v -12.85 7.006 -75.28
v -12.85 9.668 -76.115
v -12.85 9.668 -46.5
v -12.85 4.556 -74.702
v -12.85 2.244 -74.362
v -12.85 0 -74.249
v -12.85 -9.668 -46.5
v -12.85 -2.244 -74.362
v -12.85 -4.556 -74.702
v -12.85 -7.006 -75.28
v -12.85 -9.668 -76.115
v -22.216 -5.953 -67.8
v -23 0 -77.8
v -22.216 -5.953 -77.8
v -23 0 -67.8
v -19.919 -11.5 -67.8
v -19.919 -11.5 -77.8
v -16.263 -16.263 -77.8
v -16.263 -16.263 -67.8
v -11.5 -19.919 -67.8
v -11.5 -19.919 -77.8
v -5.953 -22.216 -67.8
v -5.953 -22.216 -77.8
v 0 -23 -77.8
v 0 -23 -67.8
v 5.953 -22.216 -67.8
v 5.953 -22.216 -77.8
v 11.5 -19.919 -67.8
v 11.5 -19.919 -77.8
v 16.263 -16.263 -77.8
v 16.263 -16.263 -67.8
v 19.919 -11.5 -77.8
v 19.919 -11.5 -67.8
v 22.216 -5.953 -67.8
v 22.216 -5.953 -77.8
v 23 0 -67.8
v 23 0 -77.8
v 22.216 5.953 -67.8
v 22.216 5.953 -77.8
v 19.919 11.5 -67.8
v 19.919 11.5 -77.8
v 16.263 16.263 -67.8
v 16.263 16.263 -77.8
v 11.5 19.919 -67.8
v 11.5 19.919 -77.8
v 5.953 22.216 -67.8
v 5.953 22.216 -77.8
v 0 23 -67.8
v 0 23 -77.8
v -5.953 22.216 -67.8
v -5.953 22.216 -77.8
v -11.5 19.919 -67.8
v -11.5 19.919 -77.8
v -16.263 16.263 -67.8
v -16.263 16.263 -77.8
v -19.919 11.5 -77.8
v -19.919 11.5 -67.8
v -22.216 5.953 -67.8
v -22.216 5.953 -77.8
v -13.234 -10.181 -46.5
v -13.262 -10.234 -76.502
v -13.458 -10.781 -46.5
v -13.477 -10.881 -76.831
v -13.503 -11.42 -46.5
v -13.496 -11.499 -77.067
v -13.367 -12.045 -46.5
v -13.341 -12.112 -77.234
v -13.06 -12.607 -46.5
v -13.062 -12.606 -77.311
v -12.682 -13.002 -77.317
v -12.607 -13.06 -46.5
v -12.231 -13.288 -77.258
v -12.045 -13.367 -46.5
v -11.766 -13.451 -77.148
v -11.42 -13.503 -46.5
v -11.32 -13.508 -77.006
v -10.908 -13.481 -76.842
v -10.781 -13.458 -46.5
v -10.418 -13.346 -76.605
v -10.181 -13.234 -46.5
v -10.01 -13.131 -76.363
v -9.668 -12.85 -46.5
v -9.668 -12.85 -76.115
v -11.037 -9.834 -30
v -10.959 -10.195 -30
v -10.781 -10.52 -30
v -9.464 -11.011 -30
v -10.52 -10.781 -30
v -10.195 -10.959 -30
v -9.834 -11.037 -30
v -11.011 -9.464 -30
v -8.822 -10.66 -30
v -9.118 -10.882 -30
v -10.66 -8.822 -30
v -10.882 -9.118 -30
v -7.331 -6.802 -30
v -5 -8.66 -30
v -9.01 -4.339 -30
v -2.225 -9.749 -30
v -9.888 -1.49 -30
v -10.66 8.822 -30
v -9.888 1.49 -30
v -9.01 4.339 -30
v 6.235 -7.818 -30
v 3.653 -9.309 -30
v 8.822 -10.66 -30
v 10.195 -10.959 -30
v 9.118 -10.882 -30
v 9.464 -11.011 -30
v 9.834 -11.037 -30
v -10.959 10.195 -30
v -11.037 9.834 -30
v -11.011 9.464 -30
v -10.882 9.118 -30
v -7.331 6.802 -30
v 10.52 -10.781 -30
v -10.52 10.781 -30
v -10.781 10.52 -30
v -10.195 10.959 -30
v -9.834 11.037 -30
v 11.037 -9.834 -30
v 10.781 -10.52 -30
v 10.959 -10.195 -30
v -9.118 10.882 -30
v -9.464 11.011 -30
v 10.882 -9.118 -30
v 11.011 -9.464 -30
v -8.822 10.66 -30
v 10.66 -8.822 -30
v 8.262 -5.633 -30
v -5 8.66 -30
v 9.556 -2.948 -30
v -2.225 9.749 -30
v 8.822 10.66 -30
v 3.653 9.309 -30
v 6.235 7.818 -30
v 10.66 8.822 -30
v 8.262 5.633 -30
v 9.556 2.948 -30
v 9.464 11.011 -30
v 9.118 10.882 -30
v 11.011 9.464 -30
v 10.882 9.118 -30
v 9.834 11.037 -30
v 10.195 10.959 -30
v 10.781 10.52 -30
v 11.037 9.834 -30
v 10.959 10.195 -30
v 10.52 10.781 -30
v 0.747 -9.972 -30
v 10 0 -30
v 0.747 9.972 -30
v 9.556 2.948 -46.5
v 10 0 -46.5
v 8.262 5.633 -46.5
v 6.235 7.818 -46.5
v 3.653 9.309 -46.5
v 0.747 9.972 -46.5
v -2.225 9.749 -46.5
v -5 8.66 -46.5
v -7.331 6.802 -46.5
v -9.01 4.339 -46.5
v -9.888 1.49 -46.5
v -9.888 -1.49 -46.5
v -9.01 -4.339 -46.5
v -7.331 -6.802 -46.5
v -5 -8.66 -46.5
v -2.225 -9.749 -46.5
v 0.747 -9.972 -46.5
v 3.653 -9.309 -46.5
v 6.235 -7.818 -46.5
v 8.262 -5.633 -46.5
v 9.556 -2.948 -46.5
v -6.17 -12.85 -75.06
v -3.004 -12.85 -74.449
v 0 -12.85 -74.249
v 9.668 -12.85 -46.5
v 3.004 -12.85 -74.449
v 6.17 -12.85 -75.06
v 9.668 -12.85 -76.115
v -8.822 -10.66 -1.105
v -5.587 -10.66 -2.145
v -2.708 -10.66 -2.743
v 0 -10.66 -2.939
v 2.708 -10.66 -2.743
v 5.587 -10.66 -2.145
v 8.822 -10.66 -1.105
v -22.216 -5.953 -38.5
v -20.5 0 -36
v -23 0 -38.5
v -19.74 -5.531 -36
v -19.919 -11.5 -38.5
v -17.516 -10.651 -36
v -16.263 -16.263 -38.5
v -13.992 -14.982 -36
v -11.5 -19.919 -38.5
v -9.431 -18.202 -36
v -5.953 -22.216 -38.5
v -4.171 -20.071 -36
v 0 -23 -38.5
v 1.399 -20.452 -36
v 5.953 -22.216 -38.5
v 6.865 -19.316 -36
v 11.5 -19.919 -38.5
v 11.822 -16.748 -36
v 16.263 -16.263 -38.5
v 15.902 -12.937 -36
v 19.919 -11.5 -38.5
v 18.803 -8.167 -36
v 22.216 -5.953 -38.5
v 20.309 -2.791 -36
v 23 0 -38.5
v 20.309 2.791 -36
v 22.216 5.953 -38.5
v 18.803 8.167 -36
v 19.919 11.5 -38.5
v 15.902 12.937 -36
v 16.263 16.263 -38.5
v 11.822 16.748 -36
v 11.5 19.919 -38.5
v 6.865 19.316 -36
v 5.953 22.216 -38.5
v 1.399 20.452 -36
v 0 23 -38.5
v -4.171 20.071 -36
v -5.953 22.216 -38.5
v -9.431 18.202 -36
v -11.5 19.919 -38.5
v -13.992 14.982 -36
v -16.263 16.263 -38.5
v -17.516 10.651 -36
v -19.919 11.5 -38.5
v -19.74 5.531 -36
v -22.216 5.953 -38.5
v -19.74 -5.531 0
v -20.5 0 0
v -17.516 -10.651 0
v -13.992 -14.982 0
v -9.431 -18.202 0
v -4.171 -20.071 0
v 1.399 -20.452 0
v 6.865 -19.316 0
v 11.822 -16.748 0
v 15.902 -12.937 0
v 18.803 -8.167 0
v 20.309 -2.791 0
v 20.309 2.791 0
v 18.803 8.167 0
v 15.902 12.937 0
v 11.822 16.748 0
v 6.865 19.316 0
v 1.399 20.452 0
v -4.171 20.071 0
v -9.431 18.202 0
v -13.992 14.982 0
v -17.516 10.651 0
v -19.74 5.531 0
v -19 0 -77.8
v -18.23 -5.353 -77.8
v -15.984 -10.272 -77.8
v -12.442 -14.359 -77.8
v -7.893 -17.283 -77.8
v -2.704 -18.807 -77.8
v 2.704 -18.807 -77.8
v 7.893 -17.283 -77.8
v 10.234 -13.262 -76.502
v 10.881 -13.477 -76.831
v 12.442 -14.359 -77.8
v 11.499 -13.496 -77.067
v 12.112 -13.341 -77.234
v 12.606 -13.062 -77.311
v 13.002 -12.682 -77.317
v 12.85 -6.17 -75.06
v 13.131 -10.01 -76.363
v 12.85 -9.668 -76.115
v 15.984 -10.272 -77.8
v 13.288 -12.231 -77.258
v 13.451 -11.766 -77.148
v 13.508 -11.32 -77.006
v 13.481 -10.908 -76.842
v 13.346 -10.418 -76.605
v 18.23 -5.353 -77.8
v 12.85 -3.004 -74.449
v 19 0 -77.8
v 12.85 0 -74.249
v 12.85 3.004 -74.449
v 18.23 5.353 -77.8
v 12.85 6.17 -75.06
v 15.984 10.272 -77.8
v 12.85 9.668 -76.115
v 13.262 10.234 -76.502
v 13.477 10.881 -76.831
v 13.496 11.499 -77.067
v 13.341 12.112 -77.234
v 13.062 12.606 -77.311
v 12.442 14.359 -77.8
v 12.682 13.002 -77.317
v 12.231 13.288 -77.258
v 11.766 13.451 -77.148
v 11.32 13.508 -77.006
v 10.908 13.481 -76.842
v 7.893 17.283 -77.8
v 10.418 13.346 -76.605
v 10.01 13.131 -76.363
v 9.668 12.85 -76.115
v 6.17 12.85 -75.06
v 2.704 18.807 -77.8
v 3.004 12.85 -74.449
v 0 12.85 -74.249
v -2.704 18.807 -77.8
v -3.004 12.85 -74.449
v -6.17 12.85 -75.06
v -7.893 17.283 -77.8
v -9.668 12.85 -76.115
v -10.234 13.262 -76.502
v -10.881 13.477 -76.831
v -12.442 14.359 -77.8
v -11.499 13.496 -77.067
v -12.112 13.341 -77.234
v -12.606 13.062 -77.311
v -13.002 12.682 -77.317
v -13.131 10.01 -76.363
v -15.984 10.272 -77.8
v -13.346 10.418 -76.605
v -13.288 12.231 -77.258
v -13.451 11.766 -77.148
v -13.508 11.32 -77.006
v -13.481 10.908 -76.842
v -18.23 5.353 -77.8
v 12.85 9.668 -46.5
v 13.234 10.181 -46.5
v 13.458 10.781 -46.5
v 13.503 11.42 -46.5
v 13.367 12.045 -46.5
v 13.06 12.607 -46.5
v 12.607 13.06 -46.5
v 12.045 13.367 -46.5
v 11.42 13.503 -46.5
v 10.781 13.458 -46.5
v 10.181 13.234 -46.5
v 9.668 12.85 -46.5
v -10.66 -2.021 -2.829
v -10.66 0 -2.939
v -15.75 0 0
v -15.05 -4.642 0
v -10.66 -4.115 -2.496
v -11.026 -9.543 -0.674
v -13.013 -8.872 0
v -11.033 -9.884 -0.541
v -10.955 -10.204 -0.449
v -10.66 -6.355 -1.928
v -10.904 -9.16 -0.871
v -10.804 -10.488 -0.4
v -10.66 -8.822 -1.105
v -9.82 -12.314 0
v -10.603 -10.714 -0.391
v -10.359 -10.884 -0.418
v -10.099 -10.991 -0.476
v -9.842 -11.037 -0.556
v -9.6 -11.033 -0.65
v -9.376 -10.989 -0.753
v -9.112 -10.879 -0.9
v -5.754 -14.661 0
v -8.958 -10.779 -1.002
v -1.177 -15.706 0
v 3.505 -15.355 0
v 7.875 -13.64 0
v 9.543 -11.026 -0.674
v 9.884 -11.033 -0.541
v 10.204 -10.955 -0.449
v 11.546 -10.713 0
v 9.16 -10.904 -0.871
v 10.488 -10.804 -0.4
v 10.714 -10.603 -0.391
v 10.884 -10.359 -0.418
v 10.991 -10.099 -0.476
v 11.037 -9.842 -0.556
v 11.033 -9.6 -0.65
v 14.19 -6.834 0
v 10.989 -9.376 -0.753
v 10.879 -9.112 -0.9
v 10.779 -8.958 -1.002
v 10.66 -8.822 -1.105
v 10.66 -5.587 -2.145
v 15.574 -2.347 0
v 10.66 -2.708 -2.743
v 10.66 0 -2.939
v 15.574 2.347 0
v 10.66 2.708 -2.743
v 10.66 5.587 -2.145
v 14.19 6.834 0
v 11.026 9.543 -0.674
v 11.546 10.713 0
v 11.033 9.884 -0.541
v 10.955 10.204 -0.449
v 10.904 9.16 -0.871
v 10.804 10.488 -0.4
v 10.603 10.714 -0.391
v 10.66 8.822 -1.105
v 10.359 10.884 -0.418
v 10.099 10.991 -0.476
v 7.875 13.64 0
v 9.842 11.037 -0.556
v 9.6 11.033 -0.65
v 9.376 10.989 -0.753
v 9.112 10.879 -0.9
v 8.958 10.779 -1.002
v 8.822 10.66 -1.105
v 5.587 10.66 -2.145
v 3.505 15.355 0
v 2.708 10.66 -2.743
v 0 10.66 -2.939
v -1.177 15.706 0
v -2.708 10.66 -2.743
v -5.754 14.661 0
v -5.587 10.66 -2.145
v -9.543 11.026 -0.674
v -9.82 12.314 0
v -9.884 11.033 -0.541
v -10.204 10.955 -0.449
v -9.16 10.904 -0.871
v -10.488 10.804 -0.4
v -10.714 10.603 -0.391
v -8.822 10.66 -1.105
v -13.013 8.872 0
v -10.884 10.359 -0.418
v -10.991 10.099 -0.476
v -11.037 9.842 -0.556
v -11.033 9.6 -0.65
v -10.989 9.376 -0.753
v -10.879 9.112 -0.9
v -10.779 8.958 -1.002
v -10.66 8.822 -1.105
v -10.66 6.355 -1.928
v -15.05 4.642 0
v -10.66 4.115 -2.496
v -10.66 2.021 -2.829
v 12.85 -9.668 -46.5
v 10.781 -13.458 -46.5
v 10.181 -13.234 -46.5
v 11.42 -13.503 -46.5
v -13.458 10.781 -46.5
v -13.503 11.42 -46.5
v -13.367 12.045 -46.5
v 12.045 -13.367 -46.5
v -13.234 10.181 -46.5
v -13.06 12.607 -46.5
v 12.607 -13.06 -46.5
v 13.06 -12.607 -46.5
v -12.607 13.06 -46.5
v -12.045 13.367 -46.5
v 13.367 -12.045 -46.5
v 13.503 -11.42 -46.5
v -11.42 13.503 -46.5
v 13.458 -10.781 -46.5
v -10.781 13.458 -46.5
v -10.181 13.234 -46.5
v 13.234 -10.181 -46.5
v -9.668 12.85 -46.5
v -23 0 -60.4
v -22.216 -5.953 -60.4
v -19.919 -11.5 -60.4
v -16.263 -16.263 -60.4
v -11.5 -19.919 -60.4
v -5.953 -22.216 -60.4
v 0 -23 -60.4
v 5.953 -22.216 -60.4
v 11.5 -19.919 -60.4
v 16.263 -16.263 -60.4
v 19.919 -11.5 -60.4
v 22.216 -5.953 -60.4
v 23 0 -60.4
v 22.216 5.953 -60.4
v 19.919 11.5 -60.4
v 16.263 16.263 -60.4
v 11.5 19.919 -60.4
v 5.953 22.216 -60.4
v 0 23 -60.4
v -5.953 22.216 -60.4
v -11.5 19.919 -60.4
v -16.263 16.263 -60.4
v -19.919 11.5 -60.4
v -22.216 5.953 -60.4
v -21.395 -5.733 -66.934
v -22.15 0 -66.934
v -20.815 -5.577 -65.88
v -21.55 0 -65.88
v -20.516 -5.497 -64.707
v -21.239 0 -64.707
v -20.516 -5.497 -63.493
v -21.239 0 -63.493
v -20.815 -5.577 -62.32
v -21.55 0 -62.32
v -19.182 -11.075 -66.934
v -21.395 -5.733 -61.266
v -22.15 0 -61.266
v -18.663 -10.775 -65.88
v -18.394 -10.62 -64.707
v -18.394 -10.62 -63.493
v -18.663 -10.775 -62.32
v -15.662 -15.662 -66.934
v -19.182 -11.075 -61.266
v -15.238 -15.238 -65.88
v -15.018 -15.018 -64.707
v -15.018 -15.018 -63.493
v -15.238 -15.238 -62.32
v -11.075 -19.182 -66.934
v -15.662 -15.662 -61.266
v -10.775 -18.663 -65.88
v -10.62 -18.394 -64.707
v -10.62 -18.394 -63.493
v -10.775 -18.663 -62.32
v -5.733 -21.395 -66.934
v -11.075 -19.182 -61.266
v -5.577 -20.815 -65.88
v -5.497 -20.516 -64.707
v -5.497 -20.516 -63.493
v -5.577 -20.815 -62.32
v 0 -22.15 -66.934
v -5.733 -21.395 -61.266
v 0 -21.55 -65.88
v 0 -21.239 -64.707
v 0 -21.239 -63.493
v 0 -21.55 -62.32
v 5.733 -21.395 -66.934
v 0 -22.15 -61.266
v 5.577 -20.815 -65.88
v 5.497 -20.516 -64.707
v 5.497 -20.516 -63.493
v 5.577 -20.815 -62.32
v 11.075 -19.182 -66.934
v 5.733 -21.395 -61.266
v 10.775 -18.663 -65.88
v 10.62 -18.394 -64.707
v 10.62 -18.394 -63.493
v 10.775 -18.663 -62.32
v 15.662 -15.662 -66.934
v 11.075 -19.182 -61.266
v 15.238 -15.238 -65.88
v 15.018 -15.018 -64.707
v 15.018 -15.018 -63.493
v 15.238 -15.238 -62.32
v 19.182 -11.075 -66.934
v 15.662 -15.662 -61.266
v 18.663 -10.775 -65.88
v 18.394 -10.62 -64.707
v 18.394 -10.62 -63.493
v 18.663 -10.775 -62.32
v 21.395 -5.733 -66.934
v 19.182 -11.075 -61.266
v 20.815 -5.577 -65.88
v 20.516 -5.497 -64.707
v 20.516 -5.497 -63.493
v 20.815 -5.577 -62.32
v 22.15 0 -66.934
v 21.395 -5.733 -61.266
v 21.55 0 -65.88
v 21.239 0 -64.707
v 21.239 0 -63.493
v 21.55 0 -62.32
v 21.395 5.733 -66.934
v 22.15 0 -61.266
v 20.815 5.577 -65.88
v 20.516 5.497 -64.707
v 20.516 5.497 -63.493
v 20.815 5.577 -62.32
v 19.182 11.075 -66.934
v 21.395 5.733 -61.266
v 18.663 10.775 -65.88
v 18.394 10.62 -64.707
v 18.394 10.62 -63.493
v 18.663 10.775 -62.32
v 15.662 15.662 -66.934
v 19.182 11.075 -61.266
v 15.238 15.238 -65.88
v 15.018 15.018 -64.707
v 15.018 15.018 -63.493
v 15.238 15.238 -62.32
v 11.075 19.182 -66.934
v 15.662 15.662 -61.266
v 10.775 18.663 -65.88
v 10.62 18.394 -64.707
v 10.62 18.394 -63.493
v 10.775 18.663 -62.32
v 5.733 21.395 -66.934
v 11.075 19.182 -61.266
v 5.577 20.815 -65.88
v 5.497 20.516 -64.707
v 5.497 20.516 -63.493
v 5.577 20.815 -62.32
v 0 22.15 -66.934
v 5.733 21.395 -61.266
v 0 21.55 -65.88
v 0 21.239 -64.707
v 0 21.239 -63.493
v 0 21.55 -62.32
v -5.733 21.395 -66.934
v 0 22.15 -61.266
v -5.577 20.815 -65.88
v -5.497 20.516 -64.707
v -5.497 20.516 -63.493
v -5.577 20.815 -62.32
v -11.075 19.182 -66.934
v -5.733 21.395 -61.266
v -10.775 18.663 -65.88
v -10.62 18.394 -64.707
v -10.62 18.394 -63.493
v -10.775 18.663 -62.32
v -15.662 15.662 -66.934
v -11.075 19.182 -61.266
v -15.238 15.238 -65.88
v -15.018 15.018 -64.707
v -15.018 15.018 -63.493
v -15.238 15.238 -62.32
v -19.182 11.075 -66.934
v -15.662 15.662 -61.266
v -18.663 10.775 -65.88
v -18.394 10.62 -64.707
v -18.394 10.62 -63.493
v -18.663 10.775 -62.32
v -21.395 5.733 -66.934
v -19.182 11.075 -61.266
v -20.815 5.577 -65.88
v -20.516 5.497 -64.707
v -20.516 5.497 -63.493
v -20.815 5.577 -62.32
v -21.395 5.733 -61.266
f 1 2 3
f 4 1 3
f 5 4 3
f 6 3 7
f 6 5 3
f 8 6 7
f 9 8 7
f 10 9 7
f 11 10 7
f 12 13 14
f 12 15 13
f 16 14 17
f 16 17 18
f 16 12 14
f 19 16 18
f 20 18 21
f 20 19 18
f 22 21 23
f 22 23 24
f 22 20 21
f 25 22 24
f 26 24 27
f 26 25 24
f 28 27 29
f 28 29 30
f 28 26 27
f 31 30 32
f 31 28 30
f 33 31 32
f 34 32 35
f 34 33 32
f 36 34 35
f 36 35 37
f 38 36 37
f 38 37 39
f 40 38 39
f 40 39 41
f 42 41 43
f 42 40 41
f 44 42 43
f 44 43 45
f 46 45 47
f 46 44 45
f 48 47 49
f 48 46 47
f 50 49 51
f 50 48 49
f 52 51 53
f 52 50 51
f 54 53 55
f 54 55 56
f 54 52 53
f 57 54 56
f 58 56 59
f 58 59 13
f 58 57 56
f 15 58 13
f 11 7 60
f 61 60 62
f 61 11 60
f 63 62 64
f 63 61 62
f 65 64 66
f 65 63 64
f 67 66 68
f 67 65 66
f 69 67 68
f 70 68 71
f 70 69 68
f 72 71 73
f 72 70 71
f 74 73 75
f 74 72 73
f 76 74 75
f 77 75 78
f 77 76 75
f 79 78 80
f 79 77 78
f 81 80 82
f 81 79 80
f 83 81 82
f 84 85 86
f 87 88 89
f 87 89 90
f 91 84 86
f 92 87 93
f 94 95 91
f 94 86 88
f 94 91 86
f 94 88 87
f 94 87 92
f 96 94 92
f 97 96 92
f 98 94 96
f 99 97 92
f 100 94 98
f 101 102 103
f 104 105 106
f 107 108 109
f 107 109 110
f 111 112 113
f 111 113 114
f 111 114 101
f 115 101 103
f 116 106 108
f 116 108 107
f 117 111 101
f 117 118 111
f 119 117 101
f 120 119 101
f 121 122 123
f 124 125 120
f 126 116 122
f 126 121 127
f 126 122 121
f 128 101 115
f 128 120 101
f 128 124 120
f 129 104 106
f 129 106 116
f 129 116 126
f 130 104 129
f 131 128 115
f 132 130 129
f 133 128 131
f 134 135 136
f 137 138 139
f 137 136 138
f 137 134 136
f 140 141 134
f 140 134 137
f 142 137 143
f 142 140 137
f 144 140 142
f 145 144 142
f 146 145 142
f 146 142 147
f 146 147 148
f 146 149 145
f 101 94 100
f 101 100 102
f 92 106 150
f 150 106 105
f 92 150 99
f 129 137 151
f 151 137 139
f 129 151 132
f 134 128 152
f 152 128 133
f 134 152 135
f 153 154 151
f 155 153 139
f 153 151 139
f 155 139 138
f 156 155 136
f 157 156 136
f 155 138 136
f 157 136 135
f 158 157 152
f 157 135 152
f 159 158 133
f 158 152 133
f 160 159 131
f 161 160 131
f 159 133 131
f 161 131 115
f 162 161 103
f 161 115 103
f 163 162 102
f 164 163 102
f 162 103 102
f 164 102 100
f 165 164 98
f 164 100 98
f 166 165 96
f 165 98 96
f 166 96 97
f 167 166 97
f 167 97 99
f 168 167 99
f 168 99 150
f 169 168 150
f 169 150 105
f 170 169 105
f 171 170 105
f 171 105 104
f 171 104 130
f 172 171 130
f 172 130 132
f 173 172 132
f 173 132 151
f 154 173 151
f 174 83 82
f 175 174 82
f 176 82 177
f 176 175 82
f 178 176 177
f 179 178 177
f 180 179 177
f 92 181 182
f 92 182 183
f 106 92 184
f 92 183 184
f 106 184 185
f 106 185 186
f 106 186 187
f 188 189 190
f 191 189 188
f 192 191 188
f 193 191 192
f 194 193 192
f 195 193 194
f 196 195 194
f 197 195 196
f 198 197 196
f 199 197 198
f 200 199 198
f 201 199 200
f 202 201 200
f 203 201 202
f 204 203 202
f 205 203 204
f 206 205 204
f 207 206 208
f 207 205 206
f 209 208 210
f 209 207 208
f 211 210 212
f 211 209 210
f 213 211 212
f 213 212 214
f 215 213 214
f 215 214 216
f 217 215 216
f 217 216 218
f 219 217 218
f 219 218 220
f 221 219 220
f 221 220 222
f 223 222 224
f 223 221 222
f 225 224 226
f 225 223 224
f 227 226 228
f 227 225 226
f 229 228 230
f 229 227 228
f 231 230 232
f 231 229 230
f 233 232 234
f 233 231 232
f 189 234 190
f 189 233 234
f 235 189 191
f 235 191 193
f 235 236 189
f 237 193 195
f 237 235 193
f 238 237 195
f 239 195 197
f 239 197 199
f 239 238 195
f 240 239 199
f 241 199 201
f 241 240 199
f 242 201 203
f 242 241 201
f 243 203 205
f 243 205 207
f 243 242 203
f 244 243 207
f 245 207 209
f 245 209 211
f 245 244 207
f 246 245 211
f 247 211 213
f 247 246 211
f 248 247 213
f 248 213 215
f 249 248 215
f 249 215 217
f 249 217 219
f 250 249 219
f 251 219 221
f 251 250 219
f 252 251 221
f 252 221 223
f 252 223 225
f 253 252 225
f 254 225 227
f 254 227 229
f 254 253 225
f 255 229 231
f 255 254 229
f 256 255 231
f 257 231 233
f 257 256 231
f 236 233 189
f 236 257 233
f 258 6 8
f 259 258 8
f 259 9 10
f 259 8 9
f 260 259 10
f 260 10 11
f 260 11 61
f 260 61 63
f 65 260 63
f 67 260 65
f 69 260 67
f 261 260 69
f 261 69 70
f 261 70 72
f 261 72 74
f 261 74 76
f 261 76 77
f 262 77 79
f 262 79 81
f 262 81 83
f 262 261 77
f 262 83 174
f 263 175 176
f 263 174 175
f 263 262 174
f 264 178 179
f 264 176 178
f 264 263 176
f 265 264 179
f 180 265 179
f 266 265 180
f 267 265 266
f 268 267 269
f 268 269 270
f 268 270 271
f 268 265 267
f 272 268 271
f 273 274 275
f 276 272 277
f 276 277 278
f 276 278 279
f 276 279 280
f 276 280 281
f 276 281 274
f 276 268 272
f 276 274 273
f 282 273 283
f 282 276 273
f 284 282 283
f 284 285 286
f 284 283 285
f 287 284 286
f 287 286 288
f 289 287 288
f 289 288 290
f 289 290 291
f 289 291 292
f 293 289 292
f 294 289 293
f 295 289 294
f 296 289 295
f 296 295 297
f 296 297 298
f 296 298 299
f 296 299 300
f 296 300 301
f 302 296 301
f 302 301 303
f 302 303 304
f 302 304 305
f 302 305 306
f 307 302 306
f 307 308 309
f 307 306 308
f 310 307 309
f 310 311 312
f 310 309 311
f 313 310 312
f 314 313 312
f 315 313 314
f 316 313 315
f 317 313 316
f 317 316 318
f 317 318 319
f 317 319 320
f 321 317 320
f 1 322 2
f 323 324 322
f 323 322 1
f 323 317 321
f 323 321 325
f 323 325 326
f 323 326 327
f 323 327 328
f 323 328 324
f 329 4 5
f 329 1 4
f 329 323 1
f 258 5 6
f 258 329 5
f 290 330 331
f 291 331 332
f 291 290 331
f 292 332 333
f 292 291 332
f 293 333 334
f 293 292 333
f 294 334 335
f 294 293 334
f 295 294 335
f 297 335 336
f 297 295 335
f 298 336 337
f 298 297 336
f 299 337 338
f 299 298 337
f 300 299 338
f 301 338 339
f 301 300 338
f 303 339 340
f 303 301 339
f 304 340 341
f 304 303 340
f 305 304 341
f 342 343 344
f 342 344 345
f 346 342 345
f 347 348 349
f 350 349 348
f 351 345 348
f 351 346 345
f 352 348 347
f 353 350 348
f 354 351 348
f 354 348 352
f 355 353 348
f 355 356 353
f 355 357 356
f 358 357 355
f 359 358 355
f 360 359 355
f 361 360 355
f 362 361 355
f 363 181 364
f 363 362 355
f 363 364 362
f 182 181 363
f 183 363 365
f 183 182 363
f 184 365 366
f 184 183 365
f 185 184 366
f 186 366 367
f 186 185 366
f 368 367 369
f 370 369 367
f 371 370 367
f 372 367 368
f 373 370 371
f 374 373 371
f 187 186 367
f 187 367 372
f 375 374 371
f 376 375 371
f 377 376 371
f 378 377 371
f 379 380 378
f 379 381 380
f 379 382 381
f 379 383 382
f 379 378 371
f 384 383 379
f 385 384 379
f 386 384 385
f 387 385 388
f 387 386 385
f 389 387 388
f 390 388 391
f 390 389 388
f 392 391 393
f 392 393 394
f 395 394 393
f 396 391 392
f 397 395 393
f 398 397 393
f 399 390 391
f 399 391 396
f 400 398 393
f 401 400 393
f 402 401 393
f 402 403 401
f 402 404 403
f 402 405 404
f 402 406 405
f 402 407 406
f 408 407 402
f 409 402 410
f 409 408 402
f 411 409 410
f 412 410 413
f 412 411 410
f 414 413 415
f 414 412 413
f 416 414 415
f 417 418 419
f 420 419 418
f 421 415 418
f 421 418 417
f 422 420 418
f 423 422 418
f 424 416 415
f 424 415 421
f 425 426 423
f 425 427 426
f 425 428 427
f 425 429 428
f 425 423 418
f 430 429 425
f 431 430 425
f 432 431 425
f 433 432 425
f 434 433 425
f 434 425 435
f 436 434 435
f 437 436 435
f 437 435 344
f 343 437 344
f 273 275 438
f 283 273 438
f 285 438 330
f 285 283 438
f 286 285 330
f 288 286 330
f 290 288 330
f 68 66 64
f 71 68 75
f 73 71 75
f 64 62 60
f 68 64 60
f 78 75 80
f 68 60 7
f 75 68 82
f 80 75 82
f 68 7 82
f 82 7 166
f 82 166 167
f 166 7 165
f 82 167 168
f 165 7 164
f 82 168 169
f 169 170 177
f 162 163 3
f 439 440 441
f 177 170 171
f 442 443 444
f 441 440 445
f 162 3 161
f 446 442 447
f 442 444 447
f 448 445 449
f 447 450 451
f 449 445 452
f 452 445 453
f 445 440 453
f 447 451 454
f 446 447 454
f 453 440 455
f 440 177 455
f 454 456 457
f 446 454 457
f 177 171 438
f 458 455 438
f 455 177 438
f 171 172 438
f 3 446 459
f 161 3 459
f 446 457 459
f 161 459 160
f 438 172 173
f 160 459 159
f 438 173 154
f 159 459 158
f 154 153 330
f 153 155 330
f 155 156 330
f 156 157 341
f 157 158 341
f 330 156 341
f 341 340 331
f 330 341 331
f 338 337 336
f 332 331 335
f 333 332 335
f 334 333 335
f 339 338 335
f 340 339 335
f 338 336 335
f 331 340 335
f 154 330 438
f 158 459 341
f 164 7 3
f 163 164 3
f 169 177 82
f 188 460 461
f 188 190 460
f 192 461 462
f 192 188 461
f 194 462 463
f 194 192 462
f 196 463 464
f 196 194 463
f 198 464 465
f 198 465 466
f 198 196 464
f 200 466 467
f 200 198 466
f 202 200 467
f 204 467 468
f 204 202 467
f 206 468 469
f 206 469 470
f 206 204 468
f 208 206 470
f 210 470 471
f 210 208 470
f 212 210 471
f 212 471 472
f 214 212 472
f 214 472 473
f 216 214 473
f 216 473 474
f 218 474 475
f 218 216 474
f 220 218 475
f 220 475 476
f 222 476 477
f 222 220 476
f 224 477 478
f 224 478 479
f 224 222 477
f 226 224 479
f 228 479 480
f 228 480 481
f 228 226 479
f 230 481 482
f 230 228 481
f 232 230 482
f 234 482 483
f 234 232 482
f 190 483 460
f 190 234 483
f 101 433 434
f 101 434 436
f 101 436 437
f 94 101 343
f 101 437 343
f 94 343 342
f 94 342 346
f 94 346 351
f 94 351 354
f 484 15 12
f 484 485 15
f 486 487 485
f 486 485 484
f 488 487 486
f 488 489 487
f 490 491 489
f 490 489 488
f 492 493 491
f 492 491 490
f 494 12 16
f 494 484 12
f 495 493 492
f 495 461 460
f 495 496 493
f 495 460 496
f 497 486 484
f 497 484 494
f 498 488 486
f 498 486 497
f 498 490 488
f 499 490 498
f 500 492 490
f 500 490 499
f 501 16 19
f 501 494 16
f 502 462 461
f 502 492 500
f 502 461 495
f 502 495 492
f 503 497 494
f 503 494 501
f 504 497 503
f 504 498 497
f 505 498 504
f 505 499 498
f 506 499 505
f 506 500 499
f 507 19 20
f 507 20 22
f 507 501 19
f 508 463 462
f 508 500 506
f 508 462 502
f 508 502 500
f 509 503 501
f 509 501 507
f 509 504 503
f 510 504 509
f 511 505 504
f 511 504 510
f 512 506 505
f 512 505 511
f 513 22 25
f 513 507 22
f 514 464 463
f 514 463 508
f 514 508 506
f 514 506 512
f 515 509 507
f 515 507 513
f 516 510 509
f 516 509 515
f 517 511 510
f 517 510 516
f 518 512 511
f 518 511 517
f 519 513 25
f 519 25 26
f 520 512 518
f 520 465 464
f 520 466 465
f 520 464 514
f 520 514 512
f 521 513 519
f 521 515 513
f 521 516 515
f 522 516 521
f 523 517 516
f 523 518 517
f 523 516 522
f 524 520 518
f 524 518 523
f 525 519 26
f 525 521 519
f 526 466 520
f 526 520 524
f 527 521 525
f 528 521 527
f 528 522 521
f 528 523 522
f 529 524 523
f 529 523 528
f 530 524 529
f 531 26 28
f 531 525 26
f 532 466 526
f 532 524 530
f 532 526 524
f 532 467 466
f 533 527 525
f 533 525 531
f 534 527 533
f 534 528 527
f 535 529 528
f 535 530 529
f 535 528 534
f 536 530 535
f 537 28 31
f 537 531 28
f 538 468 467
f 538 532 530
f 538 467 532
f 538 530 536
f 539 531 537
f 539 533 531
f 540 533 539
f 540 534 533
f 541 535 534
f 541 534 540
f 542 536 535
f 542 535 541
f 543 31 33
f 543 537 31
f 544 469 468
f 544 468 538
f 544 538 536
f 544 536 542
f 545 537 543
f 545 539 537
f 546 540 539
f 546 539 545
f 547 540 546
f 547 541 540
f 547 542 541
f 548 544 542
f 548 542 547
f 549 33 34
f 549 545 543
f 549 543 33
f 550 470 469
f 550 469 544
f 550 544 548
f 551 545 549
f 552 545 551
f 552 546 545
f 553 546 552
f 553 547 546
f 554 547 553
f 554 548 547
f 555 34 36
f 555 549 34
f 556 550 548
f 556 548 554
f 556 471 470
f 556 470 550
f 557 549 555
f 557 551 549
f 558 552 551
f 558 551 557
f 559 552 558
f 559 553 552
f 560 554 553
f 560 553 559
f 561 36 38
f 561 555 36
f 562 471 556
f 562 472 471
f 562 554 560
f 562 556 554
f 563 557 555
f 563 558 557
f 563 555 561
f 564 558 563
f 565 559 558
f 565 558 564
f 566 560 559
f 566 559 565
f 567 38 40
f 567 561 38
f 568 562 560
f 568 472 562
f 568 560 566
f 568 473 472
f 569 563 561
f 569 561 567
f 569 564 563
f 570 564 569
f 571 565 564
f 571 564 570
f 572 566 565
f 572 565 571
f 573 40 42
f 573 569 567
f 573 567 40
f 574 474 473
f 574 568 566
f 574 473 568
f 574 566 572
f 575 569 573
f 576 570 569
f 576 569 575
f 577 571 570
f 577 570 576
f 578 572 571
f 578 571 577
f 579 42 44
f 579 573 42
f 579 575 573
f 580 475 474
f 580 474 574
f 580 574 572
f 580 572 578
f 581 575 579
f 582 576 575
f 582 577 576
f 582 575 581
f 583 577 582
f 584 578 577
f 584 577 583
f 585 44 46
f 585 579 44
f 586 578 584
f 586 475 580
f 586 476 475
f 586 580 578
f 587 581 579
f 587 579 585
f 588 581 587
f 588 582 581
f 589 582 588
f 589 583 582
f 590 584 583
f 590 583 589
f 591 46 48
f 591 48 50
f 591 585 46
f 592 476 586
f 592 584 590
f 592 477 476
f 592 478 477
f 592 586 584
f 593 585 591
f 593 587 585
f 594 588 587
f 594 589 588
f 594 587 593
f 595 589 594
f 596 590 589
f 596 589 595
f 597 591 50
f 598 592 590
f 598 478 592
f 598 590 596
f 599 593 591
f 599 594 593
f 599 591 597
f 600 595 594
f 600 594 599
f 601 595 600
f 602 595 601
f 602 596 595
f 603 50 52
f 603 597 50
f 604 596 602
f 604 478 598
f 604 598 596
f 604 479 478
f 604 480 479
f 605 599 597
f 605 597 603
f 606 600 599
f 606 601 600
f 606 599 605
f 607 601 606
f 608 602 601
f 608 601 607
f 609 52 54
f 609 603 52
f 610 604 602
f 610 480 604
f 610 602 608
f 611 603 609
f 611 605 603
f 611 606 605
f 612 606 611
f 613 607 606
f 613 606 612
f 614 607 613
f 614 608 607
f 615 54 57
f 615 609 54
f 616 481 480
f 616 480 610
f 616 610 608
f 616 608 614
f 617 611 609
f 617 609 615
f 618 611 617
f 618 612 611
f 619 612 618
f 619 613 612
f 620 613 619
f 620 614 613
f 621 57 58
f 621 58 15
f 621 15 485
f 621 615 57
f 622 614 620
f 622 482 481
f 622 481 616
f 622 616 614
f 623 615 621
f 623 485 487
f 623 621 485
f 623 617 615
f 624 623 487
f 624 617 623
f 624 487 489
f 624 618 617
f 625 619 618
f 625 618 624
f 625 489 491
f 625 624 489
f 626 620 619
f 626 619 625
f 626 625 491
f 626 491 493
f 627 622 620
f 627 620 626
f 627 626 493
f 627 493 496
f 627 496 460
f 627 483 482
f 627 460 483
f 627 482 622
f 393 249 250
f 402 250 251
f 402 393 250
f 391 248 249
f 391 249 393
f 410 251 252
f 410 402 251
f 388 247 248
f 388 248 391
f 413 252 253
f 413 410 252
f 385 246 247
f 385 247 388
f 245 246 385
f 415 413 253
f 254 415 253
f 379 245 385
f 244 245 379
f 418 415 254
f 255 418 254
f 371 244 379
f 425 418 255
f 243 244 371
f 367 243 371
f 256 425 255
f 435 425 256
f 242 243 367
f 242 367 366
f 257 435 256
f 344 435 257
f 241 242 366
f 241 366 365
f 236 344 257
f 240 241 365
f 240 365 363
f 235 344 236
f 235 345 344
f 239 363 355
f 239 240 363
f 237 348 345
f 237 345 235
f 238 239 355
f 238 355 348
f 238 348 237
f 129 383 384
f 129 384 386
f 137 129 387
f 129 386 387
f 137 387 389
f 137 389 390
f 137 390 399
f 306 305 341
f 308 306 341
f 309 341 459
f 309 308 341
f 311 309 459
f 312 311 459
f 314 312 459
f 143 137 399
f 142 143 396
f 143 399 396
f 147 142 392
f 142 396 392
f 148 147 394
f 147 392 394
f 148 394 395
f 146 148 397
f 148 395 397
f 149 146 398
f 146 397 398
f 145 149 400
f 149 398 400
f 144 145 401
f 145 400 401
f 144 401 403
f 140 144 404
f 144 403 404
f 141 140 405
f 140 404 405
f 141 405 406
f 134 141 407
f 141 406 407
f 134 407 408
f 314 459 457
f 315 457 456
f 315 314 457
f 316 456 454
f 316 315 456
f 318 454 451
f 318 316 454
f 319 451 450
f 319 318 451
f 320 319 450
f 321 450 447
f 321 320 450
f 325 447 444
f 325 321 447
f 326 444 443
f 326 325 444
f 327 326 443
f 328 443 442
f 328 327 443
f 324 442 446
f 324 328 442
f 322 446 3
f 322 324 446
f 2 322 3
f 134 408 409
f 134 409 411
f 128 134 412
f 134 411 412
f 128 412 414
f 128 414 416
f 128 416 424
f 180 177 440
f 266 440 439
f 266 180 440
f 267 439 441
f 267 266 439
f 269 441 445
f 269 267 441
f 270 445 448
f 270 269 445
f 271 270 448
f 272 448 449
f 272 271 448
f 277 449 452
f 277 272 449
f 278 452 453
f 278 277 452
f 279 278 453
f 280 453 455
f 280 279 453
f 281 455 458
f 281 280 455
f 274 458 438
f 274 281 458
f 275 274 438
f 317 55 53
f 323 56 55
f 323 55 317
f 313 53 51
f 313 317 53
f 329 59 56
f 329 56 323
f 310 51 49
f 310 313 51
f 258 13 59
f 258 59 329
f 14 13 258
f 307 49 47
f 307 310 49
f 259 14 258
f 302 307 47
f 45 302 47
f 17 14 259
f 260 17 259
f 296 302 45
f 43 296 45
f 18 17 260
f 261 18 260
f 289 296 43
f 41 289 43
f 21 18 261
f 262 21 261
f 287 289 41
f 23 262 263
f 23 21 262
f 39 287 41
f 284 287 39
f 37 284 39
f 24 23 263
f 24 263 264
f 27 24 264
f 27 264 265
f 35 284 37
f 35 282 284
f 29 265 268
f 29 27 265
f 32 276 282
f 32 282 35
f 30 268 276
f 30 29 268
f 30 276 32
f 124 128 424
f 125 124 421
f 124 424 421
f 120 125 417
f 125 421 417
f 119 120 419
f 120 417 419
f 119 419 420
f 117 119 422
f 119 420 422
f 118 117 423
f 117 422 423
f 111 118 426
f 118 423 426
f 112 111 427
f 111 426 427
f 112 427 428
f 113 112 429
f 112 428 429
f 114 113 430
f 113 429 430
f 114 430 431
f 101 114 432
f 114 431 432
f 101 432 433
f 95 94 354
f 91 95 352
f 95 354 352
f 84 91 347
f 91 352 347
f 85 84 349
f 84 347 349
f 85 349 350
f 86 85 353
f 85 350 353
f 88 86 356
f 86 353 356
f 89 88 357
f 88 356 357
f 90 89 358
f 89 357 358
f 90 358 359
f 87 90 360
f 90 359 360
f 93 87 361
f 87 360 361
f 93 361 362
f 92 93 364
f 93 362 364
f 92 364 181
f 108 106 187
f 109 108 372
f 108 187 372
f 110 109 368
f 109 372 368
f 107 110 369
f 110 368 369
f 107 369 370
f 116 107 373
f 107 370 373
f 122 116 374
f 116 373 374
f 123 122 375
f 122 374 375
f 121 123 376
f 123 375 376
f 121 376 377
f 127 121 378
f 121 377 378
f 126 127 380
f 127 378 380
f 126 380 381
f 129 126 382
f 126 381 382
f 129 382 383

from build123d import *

# Parameters (mm, degrees)
CUT_EXTRUDE1_DEPTH = 30
SKETCH3_R          = 10
CUT_EXTRUDE2_DEPTH = 30
CUT_EXTRUDE3_DEPTH = 31.3


with BuildPart() as part:
    # Sketch1 → Revolve1 (revolve)
    with BuildSketch(Plane(origin=(0, 0, 0), x_dir=(0, 0, -1), z_dir=(1, 0, 0)), mode=Mode.PRIVATE) as revolve1_sk:
        with BuildLine():
            Line((0, 20.5), (0, 15.75))
            Line((0, 15.75), (9.09326674, 0))
            Line((9.09326674, 0), (66.830344885, 0))
            Line((66.830344885, 0), (77.8, 19))
            Line((77.8, 19), (77.8, 23))
            Line((77.8, 23), (67.8, 23))
            ThreePointArc((67.8, 23), (64.1, 21.2), (60.4, 23))
            Line((60.4, 23), (38.5, 23))
            Line((38.5, 23), (36, 20.5))
            Line((36, 20.5), (0, 20.5))
        make_face()
    revolve(revolve1_sk.sketch.rotate(Axis((0, 0, 0), (0, 0, 1)), 90), axis=Axis((0, 0, 0), (0, 0, 1)))

    # Sketch2 → Cut-Extrude1 (cut)
    with BuildSketch(Plane.XY):
        with BuildLine():
            Line((-10.66, 8.821522369), (-10.66, -8.821522369))
            ThreePointArc((-10.66, -8.821522369), (-10.66, -10.66), (-8.821522369, -10.66))
            Line((-8.821522369, -10.66), (8.821522369, -10.66))
            ThreePointArc((8.821522369, -10.66), (10.66, -10.66), (10.66, -8.821522369))
            Line((10.66, -8.821522369), (10.66, 8.821522369))
            ThreePointArc((10.66, 8.821522369), (10.66, 10.66), (8.821522369, 10.66))
            Line((8.821522369, 10.66), (-8.821522369, 10.66))
            ThreePointArc((-8.821522369, 10.66), (-10.66, 10.66), (-10.66, 8.821522369))
        make_face()
    extrude(amount=-CUT_EXTRUDE1_DEPTH, mode=Mode.SUBTRACT)

    # Sketch3 → Cut-Extrude2 (cut)
    with BuildSketch(Plane.XY.offset(-30)):
        Circle(SKETCH3_R)
    extrude(amount=-CUT_EXTRUDE2_DEPTH, mode=Mode.SUBTRACT)

    # Sketch4 → Cut-Extrude3 (cut)
    with BuildSketch(Plane(origin=(0, 0, -77.8), x_dir=(-1, 0, 0), z_dir=(0, 0, -1))):
        with BuildLine():
            Line((-12.85, -9.668019485), (-12.85, 9.668019485))
            ThreePointArc((-12.85, 9.668019485), (-12.85, 12.85), (-9.668019485, 12.85))
            Line((-9.668019485, 12.85), (9.668019485, 12.85))
            ThreePointArc((9.668019485, 12.85), (12.85, 12.85), (12.85, 9.668019485))
            Line((12.85, 9.668019485), (12.85, -9.668019485))
            ThreePointArc((12.85, -9.668019485), (12.85, -12.85), (9.668019485, -12.85))
            Line((9.668019485, -12.85), (-9.668019485, -12.85))
            ThreePointArc((-9.668019485, -12.85), (-12.85, -12.85), (-12.85, -9.668019485))
        make_face()
    extrude(amount=-CUT_EXTRUDE3_DEPTH, mode=Mode.SUBTRACT)


solid = part.part
